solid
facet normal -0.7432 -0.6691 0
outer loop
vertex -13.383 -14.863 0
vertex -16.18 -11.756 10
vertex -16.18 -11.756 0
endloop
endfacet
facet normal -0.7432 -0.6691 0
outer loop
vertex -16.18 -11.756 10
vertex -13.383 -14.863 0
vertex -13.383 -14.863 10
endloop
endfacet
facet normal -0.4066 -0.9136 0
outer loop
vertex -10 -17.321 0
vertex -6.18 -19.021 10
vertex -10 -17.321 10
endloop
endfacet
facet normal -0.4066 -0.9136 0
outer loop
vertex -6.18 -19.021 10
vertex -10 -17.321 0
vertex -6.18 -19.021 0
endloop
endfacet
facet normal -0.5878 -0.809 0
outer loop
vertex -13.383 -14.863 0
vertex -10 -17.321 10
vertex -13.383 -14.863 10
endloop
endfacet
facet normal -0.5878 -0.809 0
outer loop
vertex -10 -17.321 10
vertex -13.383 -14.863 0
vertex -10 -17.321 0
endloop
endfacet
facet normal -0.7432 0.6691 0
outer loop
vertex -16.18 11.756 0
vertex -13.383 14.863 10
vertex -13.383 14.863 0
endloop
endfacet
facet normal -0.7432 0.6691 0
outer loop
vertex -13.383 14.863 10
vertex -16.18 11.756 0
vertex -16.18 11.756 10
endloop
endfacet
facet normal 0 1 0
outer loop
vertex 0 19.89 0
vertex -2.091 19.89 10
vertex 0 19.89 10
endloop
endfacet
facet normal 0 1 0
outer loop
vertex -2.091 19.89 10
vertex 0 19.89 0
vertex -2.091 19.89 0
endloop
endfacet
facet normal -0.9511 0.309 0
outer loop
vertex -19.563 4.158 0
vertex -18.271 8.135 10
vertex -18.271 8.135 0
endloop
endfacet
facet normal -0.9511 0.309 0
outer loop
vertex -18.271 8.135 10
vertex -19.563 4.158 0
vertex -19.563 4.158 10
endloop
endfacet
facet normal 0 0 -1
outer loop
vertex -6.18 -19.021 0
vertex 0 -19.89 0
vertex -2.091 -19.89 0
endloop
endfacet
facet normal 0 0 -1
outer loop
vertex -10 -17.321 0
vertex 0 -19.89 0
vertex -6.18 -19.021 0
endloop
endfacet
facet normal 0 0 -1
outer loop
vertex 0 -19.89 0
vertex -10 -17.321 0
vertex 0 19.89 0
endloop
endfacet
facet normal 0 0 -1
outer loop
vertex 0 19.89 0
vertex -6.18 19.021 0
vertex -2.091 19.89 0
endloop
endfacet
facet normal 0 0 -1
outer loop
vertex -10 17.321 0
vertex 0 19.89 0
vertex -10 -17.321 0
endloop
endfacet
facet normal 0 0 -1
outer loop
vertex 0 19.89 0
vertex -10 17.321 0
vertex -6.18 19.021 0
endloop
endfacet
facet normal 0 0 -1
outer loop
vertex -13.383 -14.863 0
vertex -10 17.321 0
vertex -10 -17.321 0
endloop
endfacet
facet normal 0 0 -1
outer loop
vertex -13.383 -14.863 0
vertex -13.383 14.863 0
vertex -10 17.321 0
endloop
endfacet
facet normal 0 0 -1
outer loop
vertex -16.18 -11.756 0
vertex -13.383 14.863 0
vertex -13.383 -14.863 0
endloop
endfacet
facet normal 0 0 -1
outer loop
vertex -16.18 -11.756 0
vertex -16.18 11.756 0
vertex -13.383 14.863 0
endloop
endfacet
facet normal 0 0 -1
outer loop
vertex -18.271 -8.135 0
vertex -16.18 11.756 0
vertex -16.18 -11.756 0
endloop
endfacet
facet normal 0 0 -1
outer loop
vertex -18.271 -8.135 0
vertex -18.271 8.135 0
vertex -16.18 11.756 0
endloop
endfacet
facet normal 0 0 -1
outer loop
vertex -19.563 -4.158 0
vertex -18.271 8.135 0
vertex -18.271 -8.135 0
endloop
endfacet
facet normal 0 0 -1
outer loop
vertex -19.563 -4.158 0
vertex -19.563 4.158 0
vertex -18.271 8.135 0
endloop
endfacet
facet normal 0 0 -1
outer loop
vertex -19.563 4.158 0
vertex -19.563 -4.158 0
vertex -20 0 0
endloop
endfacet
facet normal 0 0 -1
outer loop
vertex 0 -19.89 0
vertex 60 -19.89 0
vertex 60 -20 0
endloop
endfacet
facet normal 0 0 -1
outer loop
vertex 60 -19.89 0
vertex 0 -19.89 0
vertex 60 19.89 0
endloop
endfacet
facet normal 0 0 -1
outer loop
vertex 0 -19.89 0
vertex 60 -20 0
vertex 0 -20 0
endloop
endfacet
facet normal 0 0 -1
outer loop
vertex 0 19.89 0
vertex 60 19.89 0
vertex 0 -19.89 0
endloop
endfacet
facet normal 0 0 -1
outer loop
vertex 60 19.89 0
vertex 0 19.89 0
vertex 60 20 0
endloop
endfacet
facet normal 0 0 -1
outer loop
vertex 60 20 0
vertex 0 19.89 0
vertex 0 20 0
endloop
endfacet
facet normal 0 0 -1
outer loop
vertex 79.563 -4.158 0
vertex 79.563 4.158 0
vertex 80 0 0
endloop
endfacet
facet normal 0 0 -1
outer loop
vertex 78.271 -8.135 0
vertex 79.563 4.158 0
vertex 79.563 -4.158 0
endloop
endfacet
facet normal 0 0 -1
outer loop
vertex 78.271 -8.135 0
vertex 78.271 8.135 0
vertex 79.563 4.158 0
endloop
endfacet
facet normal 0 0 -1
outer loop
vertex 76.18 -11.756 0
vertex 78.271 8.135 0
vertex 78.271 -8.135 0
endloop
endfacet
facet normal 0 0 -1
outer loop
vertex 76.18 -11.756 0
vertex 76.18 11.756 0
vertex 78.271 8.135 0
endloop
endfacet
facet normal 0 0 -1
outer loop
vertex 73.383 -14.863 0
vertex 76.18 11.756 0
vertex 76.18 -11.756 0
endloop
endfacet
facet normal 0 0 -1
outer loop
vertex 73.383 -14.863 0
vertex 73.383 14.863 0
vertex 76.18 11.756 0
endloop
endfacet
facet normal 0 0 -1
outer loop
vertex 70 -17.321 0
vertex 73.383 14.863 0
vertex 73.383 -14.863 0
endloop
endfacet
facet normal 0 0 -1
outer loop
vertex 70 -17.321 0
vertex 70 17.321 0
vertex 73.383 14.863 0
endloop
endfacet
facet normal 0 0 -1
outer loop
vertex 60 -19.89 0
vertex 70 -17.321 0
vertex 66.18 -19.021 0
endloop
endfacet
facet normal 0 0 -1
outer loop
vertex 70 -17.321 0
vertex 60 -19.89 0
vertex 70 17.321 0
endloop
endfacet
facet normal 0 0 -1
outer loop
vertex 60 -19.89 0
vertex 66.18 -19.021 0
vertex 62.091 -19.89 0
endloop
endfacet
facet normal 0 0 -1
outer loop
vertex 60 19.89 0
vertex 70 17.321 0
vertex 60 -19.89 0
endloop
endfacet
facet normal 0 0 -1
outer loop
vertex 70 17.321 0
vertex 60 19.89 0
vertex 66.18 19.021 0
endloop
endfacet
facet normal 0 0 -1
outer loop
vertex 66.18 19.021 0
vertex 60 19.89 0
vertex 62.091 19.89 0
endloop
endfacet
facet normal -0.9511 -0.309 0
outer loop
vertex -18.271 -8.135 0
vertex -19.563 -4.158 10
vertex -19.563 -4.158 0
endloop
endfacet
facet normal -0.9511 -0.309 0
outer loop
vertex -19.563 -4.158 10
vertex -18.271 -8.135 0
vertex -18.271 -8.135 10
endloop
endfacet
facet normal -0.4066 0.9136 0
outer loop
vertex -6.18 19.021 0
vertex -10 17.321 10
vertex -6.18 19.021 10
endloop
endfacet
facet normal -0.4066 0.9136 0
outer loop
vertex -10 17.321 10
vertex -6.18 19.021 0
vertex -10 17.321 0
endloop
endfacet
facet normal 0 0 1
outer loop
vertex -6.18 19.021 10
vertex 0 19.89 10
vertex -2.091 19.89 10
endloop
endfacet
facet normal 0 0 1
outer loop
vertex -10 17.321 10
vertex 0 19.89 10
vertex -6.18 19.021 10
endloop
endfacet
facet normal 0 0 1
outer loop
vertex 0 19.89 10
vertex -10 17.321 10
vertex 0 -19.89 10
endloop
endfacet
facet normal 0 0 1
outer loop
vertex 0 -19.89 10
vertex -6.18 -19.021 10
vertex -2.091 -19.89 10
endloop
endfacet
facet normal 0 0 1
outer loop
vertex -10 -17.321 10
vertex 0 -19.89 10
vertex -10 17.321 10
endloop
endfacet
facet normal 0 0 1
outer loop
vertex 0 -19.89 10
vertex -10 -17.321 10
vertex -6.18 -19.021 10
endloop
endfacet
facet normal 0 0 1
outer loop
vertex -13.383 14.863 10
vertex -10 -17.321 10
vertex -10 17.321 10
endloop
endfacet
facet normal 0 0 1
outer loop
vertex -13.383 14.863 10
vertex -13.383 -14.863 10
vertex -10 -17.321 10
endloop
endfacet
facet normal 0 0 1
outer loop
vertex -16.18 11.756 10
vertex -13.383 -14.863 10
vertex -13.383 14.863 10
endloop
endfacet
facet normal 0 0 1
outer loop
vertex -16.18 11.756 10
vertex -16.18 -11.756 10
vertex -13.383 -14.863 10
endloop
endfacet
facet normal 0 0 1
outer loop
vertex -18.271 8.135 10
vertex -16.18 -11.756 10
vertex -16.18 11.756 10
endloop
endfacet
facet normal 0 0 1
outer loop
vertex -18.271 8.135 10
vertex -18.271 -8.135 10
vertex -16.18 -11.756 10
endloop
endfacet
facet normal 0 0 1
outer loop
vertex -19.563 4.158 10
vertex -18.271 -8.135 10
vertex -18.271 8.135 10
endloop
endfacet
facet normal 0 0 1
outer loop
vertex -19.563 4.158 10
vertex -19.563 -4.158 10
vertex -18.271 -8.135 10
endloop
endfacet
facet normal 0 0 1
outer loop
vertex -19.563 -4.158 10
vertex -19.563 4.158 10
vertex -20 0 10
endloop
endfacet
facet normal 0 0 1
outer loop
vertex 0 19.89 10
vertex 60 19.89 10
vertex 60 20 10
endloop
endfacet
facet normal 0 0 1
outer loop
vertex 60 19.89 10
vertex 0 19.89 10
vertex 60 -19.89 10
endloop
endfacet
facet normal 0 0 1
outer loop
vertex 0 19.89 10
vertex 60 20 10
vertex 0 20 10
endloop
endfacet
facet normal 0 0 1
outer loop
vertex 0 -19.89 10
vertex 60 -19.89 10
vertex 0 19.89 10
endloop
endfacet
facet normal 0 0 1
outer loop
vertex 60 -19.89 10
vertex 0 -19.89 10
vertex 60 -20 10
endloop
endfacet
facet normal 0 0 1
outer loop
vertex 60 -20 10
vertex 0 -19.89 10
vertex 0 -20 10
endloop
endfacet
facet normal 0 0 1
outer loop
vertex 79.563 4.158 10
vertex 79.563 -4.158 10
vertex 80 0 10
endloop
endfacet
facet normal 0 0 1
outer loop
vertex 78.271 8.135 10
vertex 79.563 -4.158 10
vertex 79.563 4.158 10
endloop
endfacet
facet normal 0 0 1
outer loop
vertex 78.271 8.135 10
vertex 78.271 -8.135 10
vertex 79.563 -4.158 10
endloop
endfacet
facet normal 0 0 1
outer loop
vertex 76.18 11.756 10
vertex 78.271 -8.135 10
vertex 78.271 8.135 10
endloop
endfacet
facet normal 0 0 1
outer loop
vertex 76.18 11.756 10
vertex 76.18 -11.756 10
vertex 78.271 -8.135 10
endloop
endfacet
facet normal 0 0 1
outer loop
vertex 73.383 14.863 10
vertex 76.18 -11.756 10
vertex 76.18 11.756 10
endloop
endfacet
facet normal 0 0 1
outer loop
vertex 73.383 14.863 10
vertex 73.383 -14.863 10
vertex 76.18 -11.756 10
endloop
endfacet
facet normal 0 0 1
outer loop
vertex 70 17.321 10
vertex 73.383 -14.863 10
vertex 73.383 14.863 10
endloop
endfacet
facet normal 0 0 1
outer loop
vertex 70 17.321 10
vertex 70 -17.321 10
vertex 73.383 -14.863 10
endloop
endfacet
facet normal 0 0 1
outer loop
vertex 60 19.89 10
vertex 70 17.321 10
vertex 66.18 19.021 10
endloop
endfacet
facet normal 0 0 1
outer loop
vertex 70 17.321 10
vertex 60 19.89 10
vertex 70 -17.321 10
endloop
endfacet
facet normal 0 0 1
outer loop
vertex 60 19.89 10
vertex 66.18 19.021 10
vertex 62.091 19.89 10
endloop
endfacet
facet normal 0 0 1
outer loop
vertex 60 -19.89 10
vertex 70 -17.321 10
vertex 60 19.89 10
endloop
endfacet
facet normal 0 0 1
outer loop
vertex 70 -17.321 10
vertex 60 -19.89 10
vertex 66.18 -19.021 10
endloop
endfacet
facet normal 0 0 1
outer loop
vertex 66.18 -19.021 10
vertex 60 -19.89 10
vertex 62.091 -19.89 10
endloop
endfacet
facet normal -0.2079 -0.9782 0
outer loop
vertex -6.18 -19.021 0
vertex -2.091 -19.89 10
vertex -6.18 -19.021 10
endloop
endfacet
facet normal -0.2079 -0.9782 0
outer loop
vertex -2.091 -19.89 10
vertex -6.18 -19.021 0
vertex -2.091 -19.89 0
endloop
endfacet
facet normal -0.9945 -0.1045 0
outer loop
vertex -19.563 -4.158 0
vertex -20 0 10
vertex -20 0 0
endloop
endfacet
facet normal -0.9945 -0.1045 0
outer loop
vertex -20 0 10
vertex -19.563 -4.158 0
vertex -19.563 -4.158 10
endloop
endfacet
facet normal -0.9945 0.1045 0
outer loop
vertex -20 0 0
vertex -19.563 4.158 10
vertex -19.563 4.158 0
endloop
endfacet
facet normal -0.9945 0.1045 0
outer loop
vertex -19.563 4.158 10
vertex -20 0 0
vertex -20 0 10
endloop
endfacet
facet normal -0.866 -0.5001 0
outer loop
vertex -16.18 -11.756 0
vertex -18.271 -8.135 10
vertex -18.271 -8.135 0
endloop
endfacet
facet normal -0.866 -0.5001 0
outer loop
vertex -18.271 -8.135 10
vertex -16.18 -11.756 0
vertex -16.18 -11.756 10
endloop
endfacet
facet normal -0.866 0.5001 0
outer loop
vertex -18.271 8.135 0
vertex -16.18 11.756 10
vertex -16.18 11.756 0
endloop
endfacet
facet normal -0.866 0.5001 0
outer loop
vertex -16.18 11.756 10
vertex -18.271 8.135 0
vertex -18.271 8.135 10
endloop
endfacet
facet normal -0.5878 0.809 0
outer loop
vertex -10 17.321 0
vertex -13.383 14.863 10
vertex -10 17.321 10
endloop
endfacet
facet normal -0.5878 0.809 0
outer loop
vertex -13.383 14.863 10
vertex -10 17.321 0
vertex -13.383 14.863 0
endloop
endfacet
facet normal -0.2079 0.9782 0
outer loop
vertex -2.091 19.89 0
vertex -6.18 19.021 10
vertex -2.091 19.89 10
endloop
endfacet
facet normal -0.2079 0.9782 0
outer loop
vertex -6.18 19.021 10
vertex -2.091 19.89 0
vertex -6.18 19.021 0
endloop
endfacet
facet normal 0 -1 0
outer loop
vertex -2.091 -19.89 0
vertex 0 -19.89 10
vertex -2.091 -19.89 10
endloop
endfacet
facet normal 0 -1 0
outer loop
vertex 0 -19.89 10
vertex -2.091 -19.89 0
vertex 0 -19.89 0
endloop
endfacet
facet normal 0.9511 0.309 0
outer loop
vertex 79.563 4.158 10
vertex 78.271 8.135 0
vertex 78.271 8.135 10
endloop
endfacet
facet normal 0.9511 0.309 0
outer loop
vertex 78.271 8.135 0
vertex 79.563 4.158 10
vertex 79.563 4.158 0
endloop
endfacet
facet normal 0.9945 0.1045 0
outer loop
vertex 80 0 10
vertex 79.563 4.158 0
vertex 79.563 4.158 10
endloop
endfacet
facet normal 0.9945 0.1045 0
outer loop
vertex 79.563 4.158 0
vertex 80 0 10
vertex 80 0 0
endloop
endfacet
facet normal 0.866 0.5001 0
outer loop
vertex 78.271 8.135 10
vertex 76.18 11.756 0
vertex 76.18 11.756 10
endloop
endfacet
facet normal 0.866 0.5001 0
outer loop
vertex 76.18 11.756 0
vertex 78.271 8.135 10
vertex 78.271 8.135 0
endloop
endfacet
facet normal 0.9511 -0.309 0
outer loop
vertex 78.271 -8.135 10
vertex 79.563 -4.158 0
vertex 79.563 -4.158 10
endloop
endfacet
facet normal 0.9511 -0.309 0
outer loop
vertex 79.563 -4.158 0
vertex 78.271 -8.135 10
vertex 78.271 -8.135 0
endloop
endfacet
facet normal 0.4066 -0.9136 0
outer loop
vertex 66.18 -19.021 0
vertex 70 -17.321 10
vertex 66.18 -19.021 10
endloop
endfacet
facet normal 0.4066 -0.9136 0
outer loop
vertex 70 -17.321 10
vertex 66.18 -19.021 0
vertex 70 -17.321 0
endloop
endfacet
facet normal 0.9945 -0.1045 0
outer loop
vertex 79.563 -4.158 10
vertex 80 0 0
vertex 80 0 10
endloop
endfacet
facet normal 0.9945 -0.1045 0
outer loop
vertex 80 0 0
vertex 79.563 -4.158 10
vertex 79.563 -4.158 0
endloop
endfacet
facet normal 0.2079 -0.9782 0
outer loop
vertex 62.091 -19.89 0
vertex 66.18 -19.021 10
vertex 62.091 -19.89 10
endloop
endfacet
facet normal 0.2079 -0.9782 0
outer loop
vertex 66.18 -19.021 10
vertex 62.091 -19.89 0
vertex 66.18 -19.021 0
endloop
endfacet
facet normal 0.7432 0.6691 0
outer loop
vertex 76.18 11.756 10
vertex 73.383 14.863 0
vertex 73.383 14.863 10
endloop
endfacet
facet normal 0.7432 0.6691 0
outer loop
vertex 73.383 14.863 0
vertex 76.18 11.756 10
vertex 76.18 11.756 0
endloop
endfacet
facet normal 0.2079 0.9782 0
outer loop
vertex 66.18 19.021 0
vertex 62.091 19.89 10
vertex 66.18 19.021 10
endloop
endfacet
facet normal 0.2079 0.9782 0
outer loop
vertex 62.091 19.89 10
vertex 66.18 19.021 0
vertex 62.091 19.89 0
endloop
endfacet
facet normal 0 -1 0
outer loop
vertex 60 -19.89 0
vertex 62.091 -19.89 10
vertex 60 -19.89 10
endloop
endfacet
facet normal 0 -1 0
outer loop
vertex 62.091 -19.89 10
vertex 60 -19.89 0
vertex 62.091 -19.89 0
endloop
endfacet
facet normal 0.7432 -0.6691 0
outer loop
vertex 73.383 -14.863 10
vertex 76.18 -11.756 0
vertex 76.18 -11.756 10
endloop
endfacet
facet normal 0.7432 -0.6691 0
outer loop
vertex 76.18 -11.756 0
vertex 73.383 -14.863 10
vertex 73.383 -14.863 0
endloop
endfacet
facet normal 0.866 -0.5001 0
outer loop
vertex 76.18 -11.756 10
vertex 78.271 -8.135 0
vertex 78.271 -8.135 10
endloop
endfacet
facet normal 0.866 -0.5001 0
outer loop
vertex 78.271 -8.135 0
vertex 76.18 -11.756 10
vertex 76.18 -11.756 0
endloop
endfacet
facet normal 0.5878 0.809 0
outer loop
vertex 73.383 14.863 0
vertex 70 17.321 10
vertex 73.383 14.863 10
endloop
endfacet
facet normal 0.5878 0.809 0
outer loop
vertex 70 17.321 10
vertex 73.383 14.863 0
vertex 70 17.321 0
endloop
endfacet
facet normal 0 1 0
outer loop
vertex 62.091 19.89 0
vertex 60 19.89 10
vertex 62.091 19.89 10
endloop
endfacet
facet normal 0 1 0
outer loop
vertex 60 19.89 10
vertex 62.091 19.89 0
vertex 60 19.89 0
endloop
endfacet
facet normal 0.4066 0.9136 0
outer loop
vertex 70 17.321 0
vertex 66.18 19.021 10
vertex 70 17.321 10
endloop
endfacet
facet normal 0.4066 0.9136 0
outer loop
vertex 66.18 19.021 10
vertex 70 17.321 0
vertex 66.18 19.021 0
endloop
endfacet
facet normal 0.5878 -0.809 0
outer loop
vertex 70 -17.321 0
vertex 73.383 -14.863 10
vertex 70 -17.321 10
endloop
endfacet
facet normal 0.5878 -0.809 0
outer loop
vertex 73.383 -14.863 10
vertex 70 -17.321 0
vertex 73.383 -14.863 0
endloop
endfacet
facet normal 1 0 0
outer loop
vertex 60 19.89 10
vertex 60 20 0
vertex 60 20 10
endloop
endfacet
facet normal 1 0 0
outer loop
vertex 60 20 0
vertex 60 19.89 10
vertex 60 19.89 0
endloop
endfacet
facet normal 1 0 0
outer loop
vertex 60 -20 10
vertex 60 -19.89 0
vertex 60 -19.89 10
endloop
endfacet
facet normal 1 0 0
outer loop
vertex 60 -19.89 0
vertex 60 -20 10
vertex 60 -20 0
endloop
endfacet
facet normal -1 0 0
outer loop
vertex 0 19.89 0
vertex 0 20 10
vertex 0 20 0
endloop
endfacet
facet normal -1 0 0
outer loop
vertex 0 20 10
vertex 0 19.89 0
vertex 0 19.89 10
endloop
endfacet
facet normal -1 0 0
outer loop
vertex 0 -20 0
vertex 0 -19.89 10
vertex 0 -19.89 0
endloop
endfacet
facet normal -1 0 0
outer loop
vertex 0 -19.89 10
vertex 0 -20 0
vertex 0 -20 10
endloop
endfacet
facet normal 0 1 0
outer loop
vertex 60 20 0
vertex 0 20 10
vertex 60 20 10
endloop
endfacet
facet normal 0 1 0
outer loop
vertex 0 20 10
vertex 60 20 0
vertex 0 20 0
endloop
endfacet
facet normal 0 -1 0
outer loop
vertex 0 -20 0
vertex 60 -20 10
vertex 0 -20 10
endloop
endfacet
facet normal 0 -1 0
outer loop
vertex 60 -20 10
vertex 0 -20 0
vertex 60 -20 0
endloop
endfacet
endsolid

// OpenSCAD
module placa_snowbord(grosime, raza, lungime)
{

cylinder(h=grosime,r=raza);

translate([lungime - 2 * raza,0,0])
cylinder(h=grosime,r=raza);
   translate([0, -raza, 0]) cube([lungime - 2 * raza, 2*raza,grosime]);
}
placa_snowbord(grosime=10, raza=20, lungime=100);
